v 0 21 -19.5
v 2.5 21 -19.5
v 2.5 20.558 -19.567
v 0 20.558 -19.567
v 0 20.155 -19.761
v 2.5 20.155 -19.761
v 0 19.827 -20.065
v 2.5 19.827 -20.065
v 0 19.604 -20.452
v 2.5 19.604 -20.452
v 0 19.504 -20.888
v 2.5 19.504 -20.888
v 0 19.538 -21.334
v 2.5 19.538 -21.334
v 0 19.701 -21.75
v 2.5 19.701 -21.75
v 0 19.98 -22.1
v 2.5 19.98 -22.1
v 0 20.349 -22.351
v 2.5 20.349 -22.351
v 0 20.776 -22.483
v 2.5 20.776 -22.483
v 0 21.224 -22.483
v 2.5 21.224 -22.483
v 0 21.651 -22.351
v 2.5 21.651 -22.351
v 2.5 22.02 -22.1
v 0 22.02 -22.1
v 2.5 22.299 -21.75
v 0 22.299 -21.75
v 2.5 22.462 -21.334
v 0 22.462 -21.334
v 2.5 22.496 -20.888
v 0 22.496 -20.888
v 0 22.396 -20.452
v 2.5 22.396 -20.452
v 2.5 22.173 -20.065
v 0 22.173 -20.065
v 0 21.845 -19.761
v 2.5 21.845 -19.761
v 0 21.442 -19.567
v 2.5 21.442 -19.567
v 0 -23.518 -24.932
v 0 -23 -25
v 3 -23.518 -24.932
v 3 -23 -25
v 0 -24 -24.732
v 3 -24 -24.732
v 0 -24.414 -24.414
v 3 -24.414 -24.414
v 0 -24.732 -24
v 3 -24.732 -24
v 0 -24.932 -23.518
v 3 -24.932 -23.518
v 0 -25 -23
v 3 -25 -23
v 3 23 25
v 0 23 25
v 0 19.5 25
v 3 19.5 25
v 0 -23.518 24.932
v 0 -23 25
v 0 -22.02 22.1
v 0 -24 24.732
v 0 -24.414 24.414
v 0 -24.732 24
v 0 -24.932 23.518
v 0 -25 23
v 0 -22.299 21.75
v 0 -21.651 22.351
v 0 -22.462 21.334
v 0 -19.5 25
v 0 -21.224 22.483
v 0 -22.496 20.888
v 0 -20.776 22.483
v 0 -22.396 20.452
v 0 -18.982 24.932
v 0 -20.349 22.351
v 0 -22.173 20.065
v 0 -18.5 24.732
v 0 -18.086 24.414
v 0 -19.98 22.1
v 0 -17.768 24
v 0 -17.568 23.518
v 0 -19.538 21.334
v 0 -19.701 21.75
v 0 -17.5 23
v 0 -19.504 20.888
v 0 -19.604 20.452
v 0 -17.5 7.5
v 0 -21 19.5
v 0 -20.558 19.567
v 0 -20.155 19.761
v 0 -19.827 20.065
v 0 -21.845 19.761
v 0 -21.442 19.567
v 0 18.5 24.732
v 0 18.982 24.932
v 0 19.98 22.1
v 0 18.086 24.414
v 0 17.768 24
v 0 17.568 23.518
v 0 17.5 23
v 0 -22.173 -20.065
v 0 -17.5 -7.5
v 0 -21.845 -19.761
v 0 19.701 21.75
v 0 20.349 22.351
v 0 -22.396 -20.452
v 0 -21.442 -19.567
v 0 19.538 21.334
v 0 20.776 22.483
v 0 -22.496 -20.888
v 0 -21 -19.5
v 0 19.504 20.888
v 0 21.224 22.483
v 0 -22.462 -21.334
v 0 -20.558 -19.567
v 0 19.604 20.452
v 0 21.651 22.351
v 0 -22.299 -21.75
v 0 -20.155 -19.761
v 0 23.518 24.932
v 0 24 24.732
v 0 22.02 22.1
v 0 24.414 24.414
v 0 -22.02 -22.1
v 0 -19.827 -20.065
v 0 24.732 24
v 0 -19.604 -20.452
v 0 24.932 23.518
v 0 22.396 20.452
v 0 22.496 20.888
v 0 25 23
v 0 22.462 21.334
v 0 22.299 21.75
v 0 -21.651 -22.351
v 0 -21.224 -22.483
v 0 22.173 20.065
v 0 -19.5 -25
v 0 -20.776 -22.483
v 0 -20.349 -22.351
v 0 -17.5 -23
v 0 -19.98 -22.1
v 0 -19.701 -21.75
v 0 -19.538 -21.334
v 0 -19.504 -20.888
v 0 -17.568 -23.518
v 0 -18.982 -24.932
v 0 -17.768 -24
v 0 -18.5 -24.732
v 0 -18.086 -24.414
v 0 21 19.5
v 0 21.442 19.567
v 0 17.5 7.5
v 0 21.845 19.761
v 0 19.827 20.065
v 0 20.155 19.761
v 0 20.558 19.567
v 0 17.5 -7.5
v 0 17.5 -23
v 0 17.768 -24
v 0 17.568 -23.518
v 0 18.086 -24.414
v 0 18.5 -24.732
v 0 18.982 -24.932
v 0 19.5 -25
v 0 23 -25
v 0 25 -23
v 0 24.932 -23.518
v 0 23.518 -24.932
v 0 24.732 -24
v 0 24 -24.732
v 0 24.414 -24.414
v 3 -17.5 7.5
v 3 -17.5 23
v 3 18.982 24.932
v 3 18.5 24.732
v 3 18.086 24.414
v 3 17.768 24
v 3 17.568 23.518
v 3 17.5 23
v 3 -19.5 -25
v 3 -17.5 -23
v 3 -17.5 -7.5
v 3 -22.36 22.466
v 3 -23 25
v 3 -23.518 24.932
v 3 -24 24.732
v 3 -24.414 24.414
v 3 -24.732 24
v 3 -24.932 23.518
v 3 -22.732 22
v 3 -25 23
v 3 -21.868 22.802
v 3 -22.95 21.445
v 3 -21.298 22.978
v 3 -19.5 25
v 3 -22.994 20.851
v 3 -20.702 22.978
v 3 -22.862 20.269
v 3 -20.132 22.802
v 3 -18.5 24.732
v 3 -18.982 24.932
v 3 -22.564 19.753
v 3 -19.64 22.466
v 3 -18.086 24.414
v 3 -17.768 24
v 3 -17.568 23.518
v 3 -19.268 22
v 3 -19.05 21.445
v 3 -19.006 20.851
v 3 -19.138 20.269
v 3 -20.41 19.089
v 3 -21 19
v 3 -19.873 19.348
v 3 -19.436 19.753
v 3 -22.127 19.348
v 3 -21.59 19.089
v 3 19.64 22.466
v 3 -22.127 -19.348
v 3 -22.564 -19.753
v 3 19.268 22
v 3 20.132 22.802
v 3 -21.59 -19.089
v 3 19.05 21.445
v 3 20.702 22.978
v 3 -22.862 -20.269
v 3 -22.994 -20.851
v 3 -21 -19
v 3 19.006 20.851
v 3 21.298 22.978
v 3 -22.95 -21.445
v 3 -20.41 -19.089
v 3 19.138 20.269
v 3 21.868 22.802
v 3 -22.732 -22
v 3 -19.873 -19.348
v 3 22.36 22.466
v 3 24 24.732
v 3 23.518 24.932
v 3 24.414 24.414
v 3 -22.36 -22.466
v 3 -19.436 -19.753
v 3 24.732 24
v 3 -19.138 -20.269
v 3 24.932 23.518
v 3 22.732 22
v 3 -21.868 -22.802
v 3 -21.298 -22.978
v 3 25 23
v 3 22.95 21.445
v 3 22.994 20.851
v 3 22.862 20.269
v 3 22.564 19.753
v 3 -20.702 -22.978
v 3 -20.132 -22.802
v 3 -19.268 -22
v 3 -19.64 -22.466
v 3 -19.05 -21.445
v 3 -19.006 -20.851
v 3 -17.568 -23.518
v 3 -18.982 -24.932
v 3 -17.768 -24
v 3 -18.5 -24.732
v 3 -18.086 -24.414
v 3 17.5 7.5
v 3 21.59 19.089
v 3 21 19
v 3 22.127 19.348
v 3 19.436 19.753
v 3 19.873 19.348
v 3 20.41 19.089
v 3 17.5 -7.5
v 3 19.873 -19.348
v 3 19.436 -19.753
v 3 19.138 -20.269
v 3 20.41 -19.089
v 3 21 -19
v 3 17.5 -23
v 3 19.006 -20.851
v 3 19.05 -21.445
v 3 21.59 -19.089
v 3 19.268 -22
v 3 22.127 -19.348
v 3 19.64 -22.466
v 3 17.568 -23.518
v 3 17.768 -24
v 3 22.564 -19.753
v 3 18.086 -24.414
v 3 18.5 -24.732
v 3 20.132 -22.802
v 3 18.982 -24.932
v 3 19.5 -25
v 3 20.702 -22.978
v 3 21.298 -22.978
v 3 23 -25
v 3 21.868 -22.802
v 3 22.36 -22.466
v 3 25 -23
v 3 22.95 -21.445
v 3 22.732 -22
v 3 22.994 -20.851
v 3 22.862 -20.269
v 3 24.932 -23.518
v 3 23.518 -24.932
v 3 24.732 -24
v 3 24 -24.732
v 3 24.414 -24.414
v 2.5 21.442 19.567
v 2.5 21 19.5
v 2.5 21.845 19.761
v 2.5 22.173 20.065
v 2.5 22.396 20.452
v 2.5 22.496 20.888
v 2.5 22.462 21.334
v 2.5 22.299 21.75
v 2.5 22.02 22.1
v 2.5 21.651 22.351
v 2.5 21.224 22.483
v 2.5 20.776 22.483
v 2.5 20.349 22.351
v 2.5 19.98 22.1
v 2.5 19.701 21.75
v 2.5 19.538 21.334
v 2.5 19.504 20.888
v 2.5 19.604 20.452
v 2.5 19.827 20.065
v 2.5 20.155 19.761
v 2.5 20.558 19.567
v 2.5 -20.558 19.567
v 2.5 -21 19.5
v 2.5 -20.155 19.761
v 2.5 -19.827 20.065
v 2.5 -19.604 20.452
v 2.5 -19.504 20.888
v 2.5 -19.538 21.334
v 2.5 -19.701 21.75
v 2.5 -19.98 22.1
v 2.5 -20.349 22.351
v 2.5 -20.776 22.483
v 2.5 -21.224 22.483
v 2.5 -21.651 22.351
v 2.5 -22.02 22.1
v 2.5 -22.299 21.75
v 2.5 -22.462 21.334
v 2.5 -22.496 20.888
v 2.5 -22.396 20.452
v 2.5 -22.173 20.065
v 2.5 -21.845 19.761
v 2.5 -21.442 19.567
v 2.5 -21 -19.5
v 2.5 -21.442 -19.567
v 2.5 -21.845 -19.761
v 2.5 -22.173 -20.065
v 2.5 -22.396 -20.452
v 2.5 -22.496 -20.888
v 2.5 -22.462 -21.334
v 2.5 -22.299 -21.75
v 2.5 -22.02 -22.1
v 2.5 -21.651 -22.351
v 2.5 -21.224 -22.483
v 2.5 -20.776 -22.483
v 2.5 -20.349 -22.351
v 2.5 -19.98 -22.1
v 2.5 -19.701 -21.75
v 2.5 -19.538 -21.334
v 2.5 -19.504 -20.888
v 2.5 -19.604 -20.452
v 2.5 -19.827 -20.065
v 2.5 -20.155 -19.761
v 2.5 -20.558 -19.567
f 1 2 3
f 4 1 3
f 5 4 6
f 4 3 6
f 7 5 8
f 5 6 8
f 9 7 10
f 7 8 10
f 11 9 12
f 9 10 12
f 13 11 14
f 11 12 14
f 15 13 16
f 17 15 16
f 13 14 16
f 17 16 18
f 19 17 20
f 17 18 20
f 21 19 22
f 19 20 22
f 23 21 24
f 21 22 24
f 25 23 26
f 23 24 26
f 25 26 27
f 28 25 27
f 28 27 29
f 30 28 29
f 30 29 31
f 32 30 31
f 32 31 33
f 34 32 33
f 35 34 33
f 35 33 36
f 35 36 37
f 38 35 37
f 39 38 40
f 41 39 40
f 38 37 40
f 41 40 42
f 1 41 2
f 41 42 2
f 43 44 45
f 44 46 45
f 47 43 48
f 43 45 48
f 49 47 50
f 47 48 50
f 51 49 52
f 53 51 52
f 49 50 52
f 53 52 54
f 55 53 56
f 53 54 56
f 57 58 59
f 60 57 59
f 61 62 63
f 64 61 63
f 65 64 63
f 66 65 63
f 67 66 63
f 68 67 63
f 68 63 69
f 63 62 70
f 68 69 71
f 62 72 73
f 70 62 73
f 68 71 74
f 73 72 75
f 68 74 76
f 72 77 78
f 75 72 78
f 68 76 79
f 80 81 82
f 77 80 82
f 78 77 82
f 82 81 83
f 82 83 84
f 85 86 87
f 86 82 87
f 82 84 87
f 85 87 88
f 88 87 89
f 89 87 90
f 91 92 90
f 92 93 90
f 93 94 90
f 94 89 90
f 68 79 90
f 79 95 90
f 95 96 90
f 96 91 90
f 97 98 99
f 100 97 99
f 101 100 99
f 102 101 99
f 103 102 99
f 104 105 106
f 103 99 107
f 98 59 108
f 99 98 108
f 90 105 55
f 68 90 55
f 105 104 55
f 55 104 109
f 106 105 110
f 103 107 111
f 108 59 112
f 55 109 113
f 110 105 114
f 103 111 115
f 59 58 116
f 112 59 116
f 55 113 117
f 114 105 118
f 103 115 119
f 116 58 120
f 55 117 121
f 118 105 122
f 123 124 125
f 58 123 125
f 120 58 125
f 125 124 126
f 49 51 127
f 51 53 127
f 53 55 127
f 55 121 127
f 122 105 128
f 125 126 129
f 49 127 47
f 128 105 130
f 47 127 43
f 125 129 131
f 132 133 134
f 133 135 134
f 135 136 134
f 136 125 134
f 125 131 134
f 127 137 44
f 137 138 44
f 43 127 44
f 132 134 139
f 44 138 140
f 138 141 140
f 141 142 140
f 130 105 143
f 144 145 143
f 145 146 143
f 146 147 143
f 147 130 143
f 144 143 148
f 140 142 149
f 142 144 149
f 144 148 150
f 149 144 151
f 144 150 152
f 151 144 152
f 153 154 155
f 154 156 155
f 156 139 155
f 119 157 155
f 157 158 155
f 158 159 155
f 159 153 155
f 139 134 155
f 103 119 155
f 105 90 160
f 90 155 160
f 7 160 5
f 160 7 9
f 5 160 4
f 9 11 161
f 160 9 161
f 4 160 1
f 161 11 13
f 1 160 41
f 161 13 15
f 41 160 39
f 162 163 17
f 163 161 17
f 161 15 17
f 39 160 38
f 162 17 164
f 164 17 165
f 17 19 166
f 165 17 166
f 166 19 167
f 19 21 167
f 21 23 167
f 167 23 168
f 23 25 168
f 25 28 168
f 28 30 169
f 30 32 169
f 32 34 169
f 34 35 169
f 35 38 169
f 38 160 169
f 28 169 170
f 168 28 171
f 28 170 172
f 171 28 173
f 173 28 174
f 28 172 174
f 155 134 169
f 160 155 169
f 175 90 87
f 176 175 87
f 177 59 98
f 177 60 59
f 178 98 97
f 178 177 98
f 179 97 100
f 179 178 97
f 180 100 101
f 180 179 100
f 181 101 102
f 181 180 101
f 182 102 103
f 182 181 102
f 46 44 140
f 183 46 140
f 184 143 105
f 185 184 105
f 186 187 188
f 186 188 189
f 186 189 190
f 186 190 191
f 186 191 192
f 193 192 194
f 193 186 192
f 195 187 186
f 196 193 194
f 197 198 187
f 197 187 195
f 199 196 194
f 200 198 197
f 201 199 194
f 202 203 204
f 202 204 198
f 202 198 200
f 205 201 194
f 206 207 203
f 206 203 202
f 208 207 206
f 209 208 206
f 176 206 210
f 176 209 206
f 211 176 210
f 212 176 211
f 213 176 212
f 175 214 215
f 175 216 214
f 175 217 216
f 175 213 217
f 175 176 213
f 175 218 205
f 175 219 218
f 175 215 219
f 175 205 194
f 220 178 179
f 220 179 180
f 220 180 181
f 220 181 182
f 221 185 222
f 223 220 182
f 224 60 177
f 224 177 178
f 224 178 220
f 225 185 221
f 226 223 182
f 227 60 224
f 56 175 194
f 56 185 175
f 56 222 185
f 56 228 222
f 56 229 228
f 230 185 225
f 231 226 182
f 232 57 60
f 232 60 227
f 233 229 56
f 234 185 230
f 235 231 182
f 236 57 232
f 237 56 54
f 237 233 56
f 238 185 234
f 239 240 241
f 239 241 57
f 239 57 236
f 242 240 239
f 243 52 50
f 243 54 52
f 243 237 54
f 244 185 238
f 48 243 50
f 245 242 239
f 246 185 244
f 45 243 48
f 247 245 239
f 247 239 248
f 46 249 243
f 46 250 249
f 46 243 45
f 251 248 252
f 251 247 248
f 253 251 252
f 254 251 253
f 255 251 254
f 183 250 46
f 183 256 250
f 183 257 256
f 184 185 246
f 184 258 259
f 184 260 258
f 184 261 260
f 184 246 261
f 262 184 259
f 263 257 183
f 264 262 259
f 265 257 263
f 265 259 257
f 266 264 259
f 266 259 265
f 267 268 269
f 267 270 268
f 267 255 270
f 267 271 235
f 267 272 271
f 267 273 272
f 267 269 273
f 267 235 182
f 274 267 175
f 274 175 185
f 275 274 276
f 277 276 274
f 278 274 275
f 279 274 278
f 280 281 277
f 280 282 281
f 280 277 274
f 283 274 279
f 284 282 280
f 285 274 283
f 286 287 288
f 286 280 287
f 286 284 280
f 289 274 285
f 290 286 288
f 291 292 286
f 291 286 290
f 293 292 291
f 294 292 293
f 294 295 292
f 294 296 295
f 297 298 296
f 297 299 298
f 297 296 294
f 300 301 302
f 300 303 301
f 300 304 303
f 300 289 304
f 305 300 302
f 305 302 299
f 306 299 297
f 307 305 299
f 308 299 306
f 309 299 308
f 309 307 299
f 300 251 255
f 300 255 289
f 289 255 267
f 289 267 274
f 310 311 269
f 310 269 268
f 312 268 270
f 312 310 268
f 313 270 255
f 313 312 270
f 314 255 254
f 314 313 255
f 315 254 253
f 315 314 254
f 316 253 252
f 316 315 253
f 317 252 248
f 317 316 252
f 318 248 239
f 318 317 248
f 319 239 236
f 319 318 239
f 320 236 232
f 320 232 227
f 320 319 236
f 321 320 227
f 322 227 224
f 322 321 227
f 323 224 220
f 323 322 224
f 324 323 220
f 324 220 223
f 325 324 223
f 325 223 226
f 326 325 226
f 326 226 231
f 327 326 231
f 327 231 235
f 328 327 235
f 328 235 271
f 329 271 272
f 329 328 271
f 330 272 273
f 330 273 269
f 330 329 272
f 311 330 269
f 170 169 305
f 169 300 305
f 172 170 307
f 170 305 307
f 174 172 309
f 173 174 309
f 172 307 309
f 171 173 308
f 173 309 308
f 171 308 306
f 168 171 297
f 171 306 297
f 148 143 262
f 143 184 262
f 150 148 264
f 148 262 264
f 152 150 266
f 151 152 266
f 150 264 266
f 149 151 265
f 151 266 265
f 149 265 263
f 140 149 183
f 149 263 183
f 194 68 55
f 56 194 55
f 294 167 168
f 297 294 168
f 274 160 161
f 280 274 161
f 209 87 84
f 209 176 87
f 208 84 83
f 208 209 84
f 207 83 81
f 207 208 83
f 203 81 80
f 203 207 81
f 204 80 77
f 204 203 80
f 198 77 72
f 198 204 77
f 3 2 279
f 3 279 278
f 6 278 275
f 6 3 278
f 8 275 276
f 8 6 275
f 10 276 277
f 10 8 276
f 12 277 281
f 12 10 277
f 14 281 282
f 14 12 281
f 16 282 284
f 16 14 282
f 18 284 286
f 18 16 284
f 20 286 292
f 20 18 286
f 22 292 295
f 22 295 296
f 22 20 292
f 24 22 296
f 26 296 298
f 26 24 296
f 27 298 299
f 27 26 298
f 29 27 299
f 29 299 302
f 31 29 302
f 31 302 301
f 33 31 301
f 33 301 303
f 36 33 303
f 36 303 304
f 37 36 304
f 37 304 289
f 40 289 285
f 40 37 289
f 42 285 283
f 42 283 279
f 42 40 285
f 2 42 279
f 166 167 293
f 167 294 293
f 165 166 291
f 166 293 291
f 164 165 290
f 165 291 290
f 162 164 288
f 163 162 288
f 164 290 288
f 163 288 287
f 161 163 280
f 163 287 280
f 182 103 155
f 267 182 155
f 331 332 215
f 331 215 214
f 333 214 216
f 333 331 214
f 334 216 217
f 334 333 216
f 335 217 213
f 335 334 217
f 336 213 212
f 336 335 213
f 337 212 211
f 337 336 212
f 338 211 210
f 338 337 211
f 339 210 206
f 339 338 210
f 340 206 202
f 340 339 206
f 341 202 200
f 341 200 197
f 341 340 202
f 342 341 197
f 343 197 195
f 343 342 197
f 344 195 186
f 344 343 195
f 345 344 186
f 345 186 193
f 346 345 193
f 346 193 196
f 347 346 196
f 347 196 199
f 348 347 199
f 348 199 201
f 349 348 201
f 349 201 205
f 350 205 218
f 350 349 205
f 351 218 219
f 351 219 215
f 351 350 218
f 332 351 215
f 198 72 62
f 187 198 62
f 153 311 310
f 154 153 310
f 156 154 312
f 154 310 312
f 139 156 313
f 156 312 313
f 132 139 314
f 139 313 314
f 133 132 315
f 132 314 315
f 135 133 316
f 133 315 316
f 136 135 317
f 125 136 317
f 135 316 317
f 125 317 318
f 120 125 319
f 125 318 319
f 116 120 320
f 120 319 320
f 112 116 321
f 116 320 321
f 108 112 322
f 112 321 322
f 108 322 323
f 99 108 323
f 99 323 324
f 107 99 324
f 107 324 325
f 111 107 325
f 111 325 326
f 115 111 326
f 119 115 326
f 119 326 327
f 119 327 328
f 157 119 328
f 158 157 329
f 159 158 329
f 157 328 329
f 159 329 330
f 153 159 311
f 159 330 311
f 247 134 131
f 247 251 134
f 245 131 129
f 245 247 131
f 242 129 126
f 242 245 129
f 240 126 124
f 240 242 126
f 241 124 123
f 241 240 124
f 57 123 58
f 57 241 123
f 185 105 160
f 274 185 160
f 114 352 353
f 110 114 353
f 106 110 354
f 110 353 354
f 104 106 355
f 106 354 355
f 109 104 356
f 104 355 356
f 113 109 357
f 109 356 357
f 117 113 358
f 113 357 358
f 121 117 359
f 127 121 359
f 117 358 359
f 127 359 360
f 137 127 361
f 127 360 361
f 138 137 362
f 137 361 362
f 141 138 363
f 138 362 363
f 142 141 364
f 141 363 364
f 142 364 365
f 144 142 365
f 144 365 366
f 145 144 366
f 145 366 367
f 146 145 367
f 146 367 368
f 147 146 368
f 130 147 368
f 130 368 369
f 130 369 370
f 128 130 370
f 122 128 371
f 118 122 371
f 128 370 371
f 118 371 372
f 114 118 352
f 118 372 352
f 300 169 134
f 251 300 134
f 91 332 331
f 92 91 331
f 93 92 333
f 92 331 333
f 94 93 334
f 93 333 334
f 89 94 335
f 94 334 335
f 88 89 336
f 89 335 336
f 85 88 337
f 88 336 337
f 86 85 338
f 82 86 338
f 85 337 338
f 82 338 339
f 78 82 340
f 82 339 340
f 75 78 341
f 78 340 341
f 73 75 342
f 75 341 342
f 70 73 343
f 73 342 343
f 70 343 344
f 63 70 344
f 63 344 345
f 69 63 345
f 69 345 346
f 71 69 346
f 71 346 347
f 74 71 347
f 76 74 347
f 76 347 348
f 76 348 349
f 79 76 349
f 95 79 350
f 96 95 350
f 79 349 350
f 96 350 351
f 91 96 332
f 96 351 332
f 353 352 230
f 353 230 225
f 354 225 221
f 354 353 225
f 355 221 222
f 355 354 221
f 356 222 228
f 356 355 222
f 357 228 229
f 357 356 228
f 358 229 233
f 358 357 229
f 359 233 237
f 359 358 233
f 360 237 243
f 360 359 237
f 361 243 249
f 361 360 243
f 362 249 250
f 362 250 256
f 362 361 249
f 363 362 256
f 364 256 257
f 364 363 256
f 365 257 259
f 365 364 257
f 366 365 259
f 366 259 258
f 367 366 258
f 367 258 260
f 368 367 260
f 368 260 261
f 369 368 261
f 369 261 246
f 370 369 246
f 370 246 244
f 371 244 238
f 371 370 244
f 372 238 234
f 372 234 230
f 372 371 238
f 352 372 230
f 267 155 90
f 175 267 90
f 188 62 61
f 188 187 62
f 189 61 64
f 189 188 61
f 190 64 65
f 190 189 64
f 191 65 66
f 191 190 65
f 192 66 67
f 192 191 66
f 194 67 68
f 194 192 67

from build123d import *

# Parameters (mm, degrees)
EXTRUDE_1_DEPTH     = 3
SKETCH_2_R          = 1.5
CUT_EXTRUDE_1_DEPTH = 3
CHAMFER_1_SIZE      = 0.5
FILLET_1_R          = 2


with BuildPart() as part:
    # 草图1 → 凸台-拉伸1 (new body)
    with BuildSketch(Plane(origin=(0, 0, 0), x_dir=(0, 0, -1), z_dir=(1, 0, 0))):
        Polygon((25, 25), (-25, 25), (-25, 17.5), (-7.5, 17.5), (-7.5, -17.5), (-25, -17.5), (-25, -25), (25, -25), (25, -17.5), (7.5, -17.5), (7.5, 17.5), (25, 17.5), align=None)
    extrude(amount=EXTRUDE_1_DEPTH)

    # 草图2 → 切除-拉伸1 (cut)
    with BuildSketch(Plane(origin=(3, 0, 0), x_dir=(0, 0, -1), z_dir=(1, 0, 0))):
        with Locations((-21, 21)):
            Circle(SKETCH_2_R)
        with Locations((-21, -21)):
            Circle(SKETCH_2_R)
        with Locations(Location((21, -21, 0), (0, 0, 180))):
            Circle(SKETCH_2_R)
        with Locations(Location((21, 21, 0), (0, 0, 180))):
            Circle(SKETCH_2_R)
    extrude(amount=-CUT_EXTRUDE_1_DEPTH, mode=Mode.SUBTRACT)

    # 倒角1
    chamfer_1_edges = [part.edges().sort_by_distance(p)[0] for p in [
        (3, 21, -22.5),
        (3, -21, -22.5),
        (3, -21, 22.5),
        (3, 21, 22.5),
    ]]
    chamfer(chamfer_1_edges, length=CHAMFER_1_SIZE)

    # 圆角1
    fillet_1_edges = [part.edges().sort_by_distance(p)[0] for p in [
        (1.5, 25, 25),
        (1.5, 25, -25),
        (1.5, 17.5, -25),
        (1.5, -17.5, -25),
        (1.5, -25, -25),
        (1.5, -25, 25),
        (1.5, -17.5, 25),
        (1.5, 17.5, 25),
    ]]
    fillet(fillet_1_edges, radius=FILLET_1_R)


solid = part.part
